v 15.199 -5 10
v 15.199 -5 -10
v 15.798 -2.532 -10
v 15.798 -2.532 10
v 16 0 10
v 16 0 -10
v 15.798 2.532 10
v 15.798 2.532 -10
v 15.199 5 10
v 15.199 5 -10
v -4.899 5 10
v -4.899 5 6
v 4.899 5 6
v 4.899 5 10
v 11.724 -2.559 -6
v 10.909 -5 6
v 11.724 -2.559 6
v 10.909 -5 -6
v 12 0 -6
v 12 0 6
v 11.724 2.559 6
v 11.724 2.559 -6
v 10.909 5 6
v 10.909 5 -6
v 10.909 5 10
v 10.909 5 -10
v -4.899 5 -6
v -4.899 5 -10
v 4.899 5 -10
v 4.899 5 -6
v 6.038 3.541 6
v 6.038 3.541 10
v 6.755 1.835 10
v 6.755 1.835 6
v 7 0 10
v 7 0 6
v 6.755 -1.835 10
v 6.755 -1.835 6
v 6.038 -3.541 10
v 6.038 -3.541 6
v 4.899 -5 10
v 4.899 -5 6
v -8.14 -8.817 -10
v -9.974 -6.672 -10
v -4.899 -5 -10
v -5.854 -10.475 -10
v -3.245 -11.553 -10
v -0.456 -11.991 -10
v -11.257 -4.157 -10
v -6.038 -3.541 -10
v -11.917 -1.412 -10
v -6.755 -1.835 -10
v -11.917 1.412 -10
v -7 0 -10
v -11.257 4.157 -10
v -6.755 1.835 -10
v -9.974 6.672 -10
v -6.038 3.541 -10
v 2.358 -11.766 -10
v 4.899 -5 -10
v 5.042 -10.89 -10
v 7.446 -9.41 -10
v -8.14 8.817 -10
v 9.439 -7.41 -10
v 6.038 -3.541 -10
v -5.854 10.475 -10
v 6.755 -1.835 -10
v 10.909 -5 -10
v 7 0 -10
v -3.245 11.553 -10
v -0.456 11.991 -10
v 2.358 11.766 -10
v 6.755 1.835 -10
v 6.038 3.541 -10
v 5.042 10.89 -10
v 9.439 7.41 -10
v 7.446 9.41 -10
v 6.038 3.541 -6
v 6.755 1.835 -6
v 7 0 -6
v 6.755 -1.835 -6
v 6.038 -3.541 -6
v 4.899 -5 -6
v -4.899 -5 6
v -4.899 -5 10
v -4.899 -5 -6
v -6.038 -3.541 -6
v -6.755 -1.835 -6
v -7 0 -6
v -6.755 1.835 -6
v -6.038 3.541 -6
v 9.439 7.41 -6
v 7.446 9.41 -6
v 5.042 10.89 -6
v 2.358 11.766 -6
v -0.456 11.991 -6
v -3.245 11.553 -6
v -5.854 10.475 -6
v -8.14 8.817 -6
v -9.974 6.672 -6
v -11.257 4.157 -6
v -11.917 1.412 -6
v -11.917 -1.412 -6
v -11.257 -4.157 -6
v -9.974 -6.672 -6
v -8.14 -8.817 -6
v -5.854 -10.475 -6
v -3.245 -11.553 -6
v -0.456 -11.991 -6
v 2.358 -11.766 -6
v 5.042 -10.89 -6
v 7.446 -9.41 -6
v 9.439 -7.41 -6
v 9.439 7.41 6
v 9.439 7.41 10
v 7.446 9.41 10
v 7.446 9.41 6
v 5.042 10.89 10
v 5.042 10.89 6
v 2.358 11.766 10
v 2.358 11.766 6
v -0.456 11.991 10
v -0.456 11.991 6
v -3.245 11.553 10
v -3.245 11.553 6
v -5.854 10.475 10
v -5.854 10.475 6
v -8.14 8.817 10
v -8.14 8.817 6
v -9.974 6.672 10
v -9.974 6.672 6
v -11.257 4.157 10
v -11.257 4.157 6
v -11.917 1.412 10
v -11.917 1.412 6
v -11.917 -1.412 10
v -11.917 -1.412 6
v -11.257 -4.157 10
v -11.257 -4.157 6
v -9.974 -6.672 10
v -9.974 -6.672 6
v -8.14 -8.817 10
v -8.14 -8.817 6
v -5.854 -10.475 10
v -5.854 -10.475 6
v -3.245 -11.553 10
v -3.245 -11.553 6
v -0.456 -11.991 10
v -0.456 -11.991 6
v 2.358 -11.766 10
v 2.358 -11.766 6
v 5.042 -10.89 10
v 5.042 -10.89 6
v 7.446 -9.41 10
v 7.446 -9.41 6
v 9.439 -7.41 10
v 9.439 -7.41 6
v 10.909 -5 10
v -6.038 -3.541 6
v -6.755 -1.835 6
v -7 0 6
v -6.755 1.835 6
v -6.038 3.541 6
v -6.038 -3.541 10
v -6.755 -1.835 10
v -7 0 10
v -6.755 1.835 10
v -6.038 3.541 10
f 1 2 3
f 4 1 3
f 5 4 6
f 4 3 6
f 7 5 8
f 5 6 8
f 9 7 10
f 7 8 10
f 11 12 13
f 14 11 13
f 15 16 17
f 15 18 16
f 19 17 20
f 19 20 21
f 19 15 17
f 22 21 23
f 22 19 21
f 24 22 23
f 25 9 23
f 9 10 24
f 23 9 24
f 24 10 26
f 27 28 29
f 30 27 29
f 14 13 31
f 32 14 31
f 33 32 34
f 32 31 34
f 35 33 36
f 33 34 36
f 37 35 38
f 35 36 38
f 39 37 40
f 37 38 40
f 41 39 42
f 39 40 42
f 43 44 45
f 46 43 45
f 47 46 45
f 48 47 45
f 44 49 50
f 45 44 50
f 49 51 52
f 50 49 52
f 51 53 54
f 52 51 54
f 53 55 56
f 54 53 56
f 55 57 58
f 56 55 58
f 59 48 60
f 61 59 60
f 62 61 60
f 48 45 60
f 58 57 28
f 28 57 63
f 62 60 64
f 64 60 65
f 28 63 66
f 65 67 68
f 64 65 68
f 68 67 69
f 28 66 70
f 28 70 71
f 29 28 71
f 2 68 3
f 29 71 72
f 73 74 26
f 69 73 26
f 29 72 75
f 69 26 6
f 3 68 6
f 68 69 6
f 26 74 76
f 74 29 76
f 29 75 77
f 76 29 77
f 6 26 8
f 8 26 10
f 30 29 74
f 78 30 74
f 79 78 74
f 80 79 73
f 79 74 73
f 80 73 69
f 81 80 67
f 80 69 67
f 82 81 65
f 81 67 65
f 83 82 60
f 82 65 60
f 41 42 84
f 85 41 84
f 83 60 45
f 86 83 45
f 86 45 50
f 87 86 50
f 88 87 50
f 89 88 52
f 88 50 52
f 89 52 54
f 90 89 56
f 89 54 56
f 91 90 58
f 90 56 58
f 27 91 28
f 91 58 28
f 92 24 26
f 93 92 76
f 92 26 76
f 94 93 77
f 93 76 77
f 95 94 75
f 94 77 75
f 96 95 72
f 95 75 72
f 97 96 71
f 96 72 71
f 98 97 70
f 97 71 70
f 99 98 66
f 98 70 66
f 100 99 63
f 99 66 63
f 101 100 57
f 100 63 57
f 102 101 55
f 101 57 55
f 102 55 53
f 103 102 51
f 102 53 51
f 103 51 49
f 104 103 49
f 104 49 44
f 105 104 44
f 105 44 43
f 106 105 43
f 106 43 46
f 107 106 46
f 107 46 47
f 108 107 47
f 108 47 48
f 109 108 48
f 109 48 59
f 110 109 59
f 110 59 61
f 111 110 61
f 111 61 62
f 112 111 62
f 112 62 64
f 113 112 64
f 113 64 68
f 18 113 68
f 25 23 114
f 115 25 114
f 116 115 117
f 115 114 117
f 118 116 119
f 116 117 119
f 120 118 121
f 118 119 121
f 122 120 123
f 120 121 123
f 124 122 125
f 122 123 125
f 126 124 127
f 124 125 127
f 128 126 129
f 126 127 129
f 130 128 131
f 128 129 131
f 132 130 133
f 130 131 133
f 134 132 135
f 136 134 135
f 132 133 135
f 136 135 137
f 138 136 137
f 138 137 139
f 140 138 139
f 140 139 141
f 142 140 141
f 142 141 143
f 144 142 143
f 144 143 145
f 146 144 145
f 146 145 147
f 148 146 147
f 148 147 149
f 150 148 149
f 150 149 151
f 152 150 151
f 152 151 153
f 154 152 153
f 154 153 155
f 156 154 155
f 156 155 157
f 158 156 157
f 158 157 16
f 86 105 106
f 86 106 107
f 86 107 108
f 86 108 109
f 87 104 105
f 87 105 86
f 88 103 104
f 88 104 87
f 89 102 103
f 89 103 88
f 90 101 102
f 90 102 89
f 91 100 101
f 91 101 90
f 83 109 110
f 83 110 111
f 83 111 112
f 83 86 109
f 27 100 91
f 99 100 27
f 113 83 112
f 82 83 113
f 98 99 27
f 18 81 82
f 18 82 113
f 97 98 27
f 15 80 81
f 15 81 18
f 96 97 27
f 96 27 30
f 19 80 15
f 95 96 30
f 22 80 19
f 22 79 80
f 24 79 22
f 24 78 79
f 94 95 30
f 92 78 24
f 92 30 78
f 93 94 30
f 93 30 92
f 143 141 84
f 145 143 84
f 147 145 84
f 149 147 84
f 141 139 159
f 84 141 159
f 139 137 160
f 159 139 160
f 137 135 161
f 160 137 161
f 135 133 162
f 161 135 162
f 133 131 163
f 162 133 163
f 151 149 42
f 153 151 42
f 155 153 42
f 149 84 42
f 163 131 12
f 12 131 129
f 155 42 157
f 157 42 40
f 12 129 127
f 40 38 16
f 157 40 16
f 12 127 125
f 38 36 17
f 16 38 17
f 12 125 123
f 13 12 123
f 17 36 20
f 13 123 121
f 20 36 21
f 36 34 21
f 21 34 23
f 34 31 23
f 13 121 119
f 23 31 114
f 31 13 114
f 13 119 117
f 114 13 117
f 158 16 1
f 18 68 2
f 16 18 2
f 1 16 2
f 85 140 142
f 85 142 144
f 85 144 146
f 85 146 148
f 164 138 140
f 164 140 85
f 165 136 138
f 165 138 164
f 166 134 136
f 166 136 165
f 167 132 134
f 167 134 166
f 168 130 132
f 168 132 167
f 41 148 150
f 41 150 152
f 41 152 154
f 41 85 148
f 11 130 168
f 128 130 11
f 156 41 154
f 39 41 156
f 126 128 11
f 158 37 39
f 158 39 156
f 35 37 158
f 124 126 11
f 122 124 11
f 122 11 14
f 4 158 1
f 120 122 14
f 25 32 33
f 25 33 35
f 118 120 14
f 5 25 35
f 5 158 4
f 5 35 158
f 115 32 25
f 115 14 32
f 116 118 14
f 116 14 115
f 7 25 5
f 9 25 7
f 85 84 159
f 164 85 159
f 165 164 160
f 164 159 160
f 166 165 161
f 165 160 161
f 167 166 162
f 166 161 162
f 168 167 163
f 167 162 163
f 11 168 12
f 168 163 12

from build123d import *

# Parameters (mm, degrees)
BOSS_EXTRUDE2_DEPTH      = 10
BOSS_EXTRUDE2_DEPTH_BACK = 10
CUT_EXTRUDE1_DEPTH       = 6
CUT_EXTRUDE1_DEPTH_BACK  = 6
SKETCH3_R                = 12


with BuildPart() as part:
    # Sketch1 → Boss-Extrude2 (new, two sides: drawn at the far end of the back side and taken through both)
    with BuildSketch(Plane.XY.offset(-BOSS_EXTRUDE2_DEPTH_BACK)):
        with BuildLine():
            ThreePointArc((10.908712115, 5), (-12, 0), (10.908712115, -5))
            Line((10.908712115, -5), (15.198684154, -5))
            ThreePointArc((15.198684154, -5), (16, 0), (15.198684154, 5))
            Line((15.198684154, 5), (10.908712115, 5))
        make_face()
        with BuildLine():
            Line((-4.898979486, 5), (4.898979486, 5))
            ThreePointArc((4.898979486, 5), (7, 0), (4.898979486, -5))
            Line((4.898979486, -5), (-4.898979486, -5))
            ThreePointArc((-4.898979486, -5), (-7, 0), (-4.898979486, 5))
        make_face(mode=Mode.SUBTRACT)
    extrude(amount=BOSS_EXTRUDE2_DEPTH + BOSS_EXTRUDE2_DEPTH_BACK)

    # Sketch3 → Cut-Extrude1 (cut, two sides: drawn at the far end of the back side and taken through both)
    with BuildSketch(Plane.XY.offset(-CUT_EXTRUDE1_DEPTH_BACK)):
        Circle(SKETCH3_R)
    extrude(amount=CUT_EXTRUDE1_DEPTH + CUT_EXTRUDE1_DEPTH_BACK, mode=Mode.SUBTRACT)


solid = part.part
